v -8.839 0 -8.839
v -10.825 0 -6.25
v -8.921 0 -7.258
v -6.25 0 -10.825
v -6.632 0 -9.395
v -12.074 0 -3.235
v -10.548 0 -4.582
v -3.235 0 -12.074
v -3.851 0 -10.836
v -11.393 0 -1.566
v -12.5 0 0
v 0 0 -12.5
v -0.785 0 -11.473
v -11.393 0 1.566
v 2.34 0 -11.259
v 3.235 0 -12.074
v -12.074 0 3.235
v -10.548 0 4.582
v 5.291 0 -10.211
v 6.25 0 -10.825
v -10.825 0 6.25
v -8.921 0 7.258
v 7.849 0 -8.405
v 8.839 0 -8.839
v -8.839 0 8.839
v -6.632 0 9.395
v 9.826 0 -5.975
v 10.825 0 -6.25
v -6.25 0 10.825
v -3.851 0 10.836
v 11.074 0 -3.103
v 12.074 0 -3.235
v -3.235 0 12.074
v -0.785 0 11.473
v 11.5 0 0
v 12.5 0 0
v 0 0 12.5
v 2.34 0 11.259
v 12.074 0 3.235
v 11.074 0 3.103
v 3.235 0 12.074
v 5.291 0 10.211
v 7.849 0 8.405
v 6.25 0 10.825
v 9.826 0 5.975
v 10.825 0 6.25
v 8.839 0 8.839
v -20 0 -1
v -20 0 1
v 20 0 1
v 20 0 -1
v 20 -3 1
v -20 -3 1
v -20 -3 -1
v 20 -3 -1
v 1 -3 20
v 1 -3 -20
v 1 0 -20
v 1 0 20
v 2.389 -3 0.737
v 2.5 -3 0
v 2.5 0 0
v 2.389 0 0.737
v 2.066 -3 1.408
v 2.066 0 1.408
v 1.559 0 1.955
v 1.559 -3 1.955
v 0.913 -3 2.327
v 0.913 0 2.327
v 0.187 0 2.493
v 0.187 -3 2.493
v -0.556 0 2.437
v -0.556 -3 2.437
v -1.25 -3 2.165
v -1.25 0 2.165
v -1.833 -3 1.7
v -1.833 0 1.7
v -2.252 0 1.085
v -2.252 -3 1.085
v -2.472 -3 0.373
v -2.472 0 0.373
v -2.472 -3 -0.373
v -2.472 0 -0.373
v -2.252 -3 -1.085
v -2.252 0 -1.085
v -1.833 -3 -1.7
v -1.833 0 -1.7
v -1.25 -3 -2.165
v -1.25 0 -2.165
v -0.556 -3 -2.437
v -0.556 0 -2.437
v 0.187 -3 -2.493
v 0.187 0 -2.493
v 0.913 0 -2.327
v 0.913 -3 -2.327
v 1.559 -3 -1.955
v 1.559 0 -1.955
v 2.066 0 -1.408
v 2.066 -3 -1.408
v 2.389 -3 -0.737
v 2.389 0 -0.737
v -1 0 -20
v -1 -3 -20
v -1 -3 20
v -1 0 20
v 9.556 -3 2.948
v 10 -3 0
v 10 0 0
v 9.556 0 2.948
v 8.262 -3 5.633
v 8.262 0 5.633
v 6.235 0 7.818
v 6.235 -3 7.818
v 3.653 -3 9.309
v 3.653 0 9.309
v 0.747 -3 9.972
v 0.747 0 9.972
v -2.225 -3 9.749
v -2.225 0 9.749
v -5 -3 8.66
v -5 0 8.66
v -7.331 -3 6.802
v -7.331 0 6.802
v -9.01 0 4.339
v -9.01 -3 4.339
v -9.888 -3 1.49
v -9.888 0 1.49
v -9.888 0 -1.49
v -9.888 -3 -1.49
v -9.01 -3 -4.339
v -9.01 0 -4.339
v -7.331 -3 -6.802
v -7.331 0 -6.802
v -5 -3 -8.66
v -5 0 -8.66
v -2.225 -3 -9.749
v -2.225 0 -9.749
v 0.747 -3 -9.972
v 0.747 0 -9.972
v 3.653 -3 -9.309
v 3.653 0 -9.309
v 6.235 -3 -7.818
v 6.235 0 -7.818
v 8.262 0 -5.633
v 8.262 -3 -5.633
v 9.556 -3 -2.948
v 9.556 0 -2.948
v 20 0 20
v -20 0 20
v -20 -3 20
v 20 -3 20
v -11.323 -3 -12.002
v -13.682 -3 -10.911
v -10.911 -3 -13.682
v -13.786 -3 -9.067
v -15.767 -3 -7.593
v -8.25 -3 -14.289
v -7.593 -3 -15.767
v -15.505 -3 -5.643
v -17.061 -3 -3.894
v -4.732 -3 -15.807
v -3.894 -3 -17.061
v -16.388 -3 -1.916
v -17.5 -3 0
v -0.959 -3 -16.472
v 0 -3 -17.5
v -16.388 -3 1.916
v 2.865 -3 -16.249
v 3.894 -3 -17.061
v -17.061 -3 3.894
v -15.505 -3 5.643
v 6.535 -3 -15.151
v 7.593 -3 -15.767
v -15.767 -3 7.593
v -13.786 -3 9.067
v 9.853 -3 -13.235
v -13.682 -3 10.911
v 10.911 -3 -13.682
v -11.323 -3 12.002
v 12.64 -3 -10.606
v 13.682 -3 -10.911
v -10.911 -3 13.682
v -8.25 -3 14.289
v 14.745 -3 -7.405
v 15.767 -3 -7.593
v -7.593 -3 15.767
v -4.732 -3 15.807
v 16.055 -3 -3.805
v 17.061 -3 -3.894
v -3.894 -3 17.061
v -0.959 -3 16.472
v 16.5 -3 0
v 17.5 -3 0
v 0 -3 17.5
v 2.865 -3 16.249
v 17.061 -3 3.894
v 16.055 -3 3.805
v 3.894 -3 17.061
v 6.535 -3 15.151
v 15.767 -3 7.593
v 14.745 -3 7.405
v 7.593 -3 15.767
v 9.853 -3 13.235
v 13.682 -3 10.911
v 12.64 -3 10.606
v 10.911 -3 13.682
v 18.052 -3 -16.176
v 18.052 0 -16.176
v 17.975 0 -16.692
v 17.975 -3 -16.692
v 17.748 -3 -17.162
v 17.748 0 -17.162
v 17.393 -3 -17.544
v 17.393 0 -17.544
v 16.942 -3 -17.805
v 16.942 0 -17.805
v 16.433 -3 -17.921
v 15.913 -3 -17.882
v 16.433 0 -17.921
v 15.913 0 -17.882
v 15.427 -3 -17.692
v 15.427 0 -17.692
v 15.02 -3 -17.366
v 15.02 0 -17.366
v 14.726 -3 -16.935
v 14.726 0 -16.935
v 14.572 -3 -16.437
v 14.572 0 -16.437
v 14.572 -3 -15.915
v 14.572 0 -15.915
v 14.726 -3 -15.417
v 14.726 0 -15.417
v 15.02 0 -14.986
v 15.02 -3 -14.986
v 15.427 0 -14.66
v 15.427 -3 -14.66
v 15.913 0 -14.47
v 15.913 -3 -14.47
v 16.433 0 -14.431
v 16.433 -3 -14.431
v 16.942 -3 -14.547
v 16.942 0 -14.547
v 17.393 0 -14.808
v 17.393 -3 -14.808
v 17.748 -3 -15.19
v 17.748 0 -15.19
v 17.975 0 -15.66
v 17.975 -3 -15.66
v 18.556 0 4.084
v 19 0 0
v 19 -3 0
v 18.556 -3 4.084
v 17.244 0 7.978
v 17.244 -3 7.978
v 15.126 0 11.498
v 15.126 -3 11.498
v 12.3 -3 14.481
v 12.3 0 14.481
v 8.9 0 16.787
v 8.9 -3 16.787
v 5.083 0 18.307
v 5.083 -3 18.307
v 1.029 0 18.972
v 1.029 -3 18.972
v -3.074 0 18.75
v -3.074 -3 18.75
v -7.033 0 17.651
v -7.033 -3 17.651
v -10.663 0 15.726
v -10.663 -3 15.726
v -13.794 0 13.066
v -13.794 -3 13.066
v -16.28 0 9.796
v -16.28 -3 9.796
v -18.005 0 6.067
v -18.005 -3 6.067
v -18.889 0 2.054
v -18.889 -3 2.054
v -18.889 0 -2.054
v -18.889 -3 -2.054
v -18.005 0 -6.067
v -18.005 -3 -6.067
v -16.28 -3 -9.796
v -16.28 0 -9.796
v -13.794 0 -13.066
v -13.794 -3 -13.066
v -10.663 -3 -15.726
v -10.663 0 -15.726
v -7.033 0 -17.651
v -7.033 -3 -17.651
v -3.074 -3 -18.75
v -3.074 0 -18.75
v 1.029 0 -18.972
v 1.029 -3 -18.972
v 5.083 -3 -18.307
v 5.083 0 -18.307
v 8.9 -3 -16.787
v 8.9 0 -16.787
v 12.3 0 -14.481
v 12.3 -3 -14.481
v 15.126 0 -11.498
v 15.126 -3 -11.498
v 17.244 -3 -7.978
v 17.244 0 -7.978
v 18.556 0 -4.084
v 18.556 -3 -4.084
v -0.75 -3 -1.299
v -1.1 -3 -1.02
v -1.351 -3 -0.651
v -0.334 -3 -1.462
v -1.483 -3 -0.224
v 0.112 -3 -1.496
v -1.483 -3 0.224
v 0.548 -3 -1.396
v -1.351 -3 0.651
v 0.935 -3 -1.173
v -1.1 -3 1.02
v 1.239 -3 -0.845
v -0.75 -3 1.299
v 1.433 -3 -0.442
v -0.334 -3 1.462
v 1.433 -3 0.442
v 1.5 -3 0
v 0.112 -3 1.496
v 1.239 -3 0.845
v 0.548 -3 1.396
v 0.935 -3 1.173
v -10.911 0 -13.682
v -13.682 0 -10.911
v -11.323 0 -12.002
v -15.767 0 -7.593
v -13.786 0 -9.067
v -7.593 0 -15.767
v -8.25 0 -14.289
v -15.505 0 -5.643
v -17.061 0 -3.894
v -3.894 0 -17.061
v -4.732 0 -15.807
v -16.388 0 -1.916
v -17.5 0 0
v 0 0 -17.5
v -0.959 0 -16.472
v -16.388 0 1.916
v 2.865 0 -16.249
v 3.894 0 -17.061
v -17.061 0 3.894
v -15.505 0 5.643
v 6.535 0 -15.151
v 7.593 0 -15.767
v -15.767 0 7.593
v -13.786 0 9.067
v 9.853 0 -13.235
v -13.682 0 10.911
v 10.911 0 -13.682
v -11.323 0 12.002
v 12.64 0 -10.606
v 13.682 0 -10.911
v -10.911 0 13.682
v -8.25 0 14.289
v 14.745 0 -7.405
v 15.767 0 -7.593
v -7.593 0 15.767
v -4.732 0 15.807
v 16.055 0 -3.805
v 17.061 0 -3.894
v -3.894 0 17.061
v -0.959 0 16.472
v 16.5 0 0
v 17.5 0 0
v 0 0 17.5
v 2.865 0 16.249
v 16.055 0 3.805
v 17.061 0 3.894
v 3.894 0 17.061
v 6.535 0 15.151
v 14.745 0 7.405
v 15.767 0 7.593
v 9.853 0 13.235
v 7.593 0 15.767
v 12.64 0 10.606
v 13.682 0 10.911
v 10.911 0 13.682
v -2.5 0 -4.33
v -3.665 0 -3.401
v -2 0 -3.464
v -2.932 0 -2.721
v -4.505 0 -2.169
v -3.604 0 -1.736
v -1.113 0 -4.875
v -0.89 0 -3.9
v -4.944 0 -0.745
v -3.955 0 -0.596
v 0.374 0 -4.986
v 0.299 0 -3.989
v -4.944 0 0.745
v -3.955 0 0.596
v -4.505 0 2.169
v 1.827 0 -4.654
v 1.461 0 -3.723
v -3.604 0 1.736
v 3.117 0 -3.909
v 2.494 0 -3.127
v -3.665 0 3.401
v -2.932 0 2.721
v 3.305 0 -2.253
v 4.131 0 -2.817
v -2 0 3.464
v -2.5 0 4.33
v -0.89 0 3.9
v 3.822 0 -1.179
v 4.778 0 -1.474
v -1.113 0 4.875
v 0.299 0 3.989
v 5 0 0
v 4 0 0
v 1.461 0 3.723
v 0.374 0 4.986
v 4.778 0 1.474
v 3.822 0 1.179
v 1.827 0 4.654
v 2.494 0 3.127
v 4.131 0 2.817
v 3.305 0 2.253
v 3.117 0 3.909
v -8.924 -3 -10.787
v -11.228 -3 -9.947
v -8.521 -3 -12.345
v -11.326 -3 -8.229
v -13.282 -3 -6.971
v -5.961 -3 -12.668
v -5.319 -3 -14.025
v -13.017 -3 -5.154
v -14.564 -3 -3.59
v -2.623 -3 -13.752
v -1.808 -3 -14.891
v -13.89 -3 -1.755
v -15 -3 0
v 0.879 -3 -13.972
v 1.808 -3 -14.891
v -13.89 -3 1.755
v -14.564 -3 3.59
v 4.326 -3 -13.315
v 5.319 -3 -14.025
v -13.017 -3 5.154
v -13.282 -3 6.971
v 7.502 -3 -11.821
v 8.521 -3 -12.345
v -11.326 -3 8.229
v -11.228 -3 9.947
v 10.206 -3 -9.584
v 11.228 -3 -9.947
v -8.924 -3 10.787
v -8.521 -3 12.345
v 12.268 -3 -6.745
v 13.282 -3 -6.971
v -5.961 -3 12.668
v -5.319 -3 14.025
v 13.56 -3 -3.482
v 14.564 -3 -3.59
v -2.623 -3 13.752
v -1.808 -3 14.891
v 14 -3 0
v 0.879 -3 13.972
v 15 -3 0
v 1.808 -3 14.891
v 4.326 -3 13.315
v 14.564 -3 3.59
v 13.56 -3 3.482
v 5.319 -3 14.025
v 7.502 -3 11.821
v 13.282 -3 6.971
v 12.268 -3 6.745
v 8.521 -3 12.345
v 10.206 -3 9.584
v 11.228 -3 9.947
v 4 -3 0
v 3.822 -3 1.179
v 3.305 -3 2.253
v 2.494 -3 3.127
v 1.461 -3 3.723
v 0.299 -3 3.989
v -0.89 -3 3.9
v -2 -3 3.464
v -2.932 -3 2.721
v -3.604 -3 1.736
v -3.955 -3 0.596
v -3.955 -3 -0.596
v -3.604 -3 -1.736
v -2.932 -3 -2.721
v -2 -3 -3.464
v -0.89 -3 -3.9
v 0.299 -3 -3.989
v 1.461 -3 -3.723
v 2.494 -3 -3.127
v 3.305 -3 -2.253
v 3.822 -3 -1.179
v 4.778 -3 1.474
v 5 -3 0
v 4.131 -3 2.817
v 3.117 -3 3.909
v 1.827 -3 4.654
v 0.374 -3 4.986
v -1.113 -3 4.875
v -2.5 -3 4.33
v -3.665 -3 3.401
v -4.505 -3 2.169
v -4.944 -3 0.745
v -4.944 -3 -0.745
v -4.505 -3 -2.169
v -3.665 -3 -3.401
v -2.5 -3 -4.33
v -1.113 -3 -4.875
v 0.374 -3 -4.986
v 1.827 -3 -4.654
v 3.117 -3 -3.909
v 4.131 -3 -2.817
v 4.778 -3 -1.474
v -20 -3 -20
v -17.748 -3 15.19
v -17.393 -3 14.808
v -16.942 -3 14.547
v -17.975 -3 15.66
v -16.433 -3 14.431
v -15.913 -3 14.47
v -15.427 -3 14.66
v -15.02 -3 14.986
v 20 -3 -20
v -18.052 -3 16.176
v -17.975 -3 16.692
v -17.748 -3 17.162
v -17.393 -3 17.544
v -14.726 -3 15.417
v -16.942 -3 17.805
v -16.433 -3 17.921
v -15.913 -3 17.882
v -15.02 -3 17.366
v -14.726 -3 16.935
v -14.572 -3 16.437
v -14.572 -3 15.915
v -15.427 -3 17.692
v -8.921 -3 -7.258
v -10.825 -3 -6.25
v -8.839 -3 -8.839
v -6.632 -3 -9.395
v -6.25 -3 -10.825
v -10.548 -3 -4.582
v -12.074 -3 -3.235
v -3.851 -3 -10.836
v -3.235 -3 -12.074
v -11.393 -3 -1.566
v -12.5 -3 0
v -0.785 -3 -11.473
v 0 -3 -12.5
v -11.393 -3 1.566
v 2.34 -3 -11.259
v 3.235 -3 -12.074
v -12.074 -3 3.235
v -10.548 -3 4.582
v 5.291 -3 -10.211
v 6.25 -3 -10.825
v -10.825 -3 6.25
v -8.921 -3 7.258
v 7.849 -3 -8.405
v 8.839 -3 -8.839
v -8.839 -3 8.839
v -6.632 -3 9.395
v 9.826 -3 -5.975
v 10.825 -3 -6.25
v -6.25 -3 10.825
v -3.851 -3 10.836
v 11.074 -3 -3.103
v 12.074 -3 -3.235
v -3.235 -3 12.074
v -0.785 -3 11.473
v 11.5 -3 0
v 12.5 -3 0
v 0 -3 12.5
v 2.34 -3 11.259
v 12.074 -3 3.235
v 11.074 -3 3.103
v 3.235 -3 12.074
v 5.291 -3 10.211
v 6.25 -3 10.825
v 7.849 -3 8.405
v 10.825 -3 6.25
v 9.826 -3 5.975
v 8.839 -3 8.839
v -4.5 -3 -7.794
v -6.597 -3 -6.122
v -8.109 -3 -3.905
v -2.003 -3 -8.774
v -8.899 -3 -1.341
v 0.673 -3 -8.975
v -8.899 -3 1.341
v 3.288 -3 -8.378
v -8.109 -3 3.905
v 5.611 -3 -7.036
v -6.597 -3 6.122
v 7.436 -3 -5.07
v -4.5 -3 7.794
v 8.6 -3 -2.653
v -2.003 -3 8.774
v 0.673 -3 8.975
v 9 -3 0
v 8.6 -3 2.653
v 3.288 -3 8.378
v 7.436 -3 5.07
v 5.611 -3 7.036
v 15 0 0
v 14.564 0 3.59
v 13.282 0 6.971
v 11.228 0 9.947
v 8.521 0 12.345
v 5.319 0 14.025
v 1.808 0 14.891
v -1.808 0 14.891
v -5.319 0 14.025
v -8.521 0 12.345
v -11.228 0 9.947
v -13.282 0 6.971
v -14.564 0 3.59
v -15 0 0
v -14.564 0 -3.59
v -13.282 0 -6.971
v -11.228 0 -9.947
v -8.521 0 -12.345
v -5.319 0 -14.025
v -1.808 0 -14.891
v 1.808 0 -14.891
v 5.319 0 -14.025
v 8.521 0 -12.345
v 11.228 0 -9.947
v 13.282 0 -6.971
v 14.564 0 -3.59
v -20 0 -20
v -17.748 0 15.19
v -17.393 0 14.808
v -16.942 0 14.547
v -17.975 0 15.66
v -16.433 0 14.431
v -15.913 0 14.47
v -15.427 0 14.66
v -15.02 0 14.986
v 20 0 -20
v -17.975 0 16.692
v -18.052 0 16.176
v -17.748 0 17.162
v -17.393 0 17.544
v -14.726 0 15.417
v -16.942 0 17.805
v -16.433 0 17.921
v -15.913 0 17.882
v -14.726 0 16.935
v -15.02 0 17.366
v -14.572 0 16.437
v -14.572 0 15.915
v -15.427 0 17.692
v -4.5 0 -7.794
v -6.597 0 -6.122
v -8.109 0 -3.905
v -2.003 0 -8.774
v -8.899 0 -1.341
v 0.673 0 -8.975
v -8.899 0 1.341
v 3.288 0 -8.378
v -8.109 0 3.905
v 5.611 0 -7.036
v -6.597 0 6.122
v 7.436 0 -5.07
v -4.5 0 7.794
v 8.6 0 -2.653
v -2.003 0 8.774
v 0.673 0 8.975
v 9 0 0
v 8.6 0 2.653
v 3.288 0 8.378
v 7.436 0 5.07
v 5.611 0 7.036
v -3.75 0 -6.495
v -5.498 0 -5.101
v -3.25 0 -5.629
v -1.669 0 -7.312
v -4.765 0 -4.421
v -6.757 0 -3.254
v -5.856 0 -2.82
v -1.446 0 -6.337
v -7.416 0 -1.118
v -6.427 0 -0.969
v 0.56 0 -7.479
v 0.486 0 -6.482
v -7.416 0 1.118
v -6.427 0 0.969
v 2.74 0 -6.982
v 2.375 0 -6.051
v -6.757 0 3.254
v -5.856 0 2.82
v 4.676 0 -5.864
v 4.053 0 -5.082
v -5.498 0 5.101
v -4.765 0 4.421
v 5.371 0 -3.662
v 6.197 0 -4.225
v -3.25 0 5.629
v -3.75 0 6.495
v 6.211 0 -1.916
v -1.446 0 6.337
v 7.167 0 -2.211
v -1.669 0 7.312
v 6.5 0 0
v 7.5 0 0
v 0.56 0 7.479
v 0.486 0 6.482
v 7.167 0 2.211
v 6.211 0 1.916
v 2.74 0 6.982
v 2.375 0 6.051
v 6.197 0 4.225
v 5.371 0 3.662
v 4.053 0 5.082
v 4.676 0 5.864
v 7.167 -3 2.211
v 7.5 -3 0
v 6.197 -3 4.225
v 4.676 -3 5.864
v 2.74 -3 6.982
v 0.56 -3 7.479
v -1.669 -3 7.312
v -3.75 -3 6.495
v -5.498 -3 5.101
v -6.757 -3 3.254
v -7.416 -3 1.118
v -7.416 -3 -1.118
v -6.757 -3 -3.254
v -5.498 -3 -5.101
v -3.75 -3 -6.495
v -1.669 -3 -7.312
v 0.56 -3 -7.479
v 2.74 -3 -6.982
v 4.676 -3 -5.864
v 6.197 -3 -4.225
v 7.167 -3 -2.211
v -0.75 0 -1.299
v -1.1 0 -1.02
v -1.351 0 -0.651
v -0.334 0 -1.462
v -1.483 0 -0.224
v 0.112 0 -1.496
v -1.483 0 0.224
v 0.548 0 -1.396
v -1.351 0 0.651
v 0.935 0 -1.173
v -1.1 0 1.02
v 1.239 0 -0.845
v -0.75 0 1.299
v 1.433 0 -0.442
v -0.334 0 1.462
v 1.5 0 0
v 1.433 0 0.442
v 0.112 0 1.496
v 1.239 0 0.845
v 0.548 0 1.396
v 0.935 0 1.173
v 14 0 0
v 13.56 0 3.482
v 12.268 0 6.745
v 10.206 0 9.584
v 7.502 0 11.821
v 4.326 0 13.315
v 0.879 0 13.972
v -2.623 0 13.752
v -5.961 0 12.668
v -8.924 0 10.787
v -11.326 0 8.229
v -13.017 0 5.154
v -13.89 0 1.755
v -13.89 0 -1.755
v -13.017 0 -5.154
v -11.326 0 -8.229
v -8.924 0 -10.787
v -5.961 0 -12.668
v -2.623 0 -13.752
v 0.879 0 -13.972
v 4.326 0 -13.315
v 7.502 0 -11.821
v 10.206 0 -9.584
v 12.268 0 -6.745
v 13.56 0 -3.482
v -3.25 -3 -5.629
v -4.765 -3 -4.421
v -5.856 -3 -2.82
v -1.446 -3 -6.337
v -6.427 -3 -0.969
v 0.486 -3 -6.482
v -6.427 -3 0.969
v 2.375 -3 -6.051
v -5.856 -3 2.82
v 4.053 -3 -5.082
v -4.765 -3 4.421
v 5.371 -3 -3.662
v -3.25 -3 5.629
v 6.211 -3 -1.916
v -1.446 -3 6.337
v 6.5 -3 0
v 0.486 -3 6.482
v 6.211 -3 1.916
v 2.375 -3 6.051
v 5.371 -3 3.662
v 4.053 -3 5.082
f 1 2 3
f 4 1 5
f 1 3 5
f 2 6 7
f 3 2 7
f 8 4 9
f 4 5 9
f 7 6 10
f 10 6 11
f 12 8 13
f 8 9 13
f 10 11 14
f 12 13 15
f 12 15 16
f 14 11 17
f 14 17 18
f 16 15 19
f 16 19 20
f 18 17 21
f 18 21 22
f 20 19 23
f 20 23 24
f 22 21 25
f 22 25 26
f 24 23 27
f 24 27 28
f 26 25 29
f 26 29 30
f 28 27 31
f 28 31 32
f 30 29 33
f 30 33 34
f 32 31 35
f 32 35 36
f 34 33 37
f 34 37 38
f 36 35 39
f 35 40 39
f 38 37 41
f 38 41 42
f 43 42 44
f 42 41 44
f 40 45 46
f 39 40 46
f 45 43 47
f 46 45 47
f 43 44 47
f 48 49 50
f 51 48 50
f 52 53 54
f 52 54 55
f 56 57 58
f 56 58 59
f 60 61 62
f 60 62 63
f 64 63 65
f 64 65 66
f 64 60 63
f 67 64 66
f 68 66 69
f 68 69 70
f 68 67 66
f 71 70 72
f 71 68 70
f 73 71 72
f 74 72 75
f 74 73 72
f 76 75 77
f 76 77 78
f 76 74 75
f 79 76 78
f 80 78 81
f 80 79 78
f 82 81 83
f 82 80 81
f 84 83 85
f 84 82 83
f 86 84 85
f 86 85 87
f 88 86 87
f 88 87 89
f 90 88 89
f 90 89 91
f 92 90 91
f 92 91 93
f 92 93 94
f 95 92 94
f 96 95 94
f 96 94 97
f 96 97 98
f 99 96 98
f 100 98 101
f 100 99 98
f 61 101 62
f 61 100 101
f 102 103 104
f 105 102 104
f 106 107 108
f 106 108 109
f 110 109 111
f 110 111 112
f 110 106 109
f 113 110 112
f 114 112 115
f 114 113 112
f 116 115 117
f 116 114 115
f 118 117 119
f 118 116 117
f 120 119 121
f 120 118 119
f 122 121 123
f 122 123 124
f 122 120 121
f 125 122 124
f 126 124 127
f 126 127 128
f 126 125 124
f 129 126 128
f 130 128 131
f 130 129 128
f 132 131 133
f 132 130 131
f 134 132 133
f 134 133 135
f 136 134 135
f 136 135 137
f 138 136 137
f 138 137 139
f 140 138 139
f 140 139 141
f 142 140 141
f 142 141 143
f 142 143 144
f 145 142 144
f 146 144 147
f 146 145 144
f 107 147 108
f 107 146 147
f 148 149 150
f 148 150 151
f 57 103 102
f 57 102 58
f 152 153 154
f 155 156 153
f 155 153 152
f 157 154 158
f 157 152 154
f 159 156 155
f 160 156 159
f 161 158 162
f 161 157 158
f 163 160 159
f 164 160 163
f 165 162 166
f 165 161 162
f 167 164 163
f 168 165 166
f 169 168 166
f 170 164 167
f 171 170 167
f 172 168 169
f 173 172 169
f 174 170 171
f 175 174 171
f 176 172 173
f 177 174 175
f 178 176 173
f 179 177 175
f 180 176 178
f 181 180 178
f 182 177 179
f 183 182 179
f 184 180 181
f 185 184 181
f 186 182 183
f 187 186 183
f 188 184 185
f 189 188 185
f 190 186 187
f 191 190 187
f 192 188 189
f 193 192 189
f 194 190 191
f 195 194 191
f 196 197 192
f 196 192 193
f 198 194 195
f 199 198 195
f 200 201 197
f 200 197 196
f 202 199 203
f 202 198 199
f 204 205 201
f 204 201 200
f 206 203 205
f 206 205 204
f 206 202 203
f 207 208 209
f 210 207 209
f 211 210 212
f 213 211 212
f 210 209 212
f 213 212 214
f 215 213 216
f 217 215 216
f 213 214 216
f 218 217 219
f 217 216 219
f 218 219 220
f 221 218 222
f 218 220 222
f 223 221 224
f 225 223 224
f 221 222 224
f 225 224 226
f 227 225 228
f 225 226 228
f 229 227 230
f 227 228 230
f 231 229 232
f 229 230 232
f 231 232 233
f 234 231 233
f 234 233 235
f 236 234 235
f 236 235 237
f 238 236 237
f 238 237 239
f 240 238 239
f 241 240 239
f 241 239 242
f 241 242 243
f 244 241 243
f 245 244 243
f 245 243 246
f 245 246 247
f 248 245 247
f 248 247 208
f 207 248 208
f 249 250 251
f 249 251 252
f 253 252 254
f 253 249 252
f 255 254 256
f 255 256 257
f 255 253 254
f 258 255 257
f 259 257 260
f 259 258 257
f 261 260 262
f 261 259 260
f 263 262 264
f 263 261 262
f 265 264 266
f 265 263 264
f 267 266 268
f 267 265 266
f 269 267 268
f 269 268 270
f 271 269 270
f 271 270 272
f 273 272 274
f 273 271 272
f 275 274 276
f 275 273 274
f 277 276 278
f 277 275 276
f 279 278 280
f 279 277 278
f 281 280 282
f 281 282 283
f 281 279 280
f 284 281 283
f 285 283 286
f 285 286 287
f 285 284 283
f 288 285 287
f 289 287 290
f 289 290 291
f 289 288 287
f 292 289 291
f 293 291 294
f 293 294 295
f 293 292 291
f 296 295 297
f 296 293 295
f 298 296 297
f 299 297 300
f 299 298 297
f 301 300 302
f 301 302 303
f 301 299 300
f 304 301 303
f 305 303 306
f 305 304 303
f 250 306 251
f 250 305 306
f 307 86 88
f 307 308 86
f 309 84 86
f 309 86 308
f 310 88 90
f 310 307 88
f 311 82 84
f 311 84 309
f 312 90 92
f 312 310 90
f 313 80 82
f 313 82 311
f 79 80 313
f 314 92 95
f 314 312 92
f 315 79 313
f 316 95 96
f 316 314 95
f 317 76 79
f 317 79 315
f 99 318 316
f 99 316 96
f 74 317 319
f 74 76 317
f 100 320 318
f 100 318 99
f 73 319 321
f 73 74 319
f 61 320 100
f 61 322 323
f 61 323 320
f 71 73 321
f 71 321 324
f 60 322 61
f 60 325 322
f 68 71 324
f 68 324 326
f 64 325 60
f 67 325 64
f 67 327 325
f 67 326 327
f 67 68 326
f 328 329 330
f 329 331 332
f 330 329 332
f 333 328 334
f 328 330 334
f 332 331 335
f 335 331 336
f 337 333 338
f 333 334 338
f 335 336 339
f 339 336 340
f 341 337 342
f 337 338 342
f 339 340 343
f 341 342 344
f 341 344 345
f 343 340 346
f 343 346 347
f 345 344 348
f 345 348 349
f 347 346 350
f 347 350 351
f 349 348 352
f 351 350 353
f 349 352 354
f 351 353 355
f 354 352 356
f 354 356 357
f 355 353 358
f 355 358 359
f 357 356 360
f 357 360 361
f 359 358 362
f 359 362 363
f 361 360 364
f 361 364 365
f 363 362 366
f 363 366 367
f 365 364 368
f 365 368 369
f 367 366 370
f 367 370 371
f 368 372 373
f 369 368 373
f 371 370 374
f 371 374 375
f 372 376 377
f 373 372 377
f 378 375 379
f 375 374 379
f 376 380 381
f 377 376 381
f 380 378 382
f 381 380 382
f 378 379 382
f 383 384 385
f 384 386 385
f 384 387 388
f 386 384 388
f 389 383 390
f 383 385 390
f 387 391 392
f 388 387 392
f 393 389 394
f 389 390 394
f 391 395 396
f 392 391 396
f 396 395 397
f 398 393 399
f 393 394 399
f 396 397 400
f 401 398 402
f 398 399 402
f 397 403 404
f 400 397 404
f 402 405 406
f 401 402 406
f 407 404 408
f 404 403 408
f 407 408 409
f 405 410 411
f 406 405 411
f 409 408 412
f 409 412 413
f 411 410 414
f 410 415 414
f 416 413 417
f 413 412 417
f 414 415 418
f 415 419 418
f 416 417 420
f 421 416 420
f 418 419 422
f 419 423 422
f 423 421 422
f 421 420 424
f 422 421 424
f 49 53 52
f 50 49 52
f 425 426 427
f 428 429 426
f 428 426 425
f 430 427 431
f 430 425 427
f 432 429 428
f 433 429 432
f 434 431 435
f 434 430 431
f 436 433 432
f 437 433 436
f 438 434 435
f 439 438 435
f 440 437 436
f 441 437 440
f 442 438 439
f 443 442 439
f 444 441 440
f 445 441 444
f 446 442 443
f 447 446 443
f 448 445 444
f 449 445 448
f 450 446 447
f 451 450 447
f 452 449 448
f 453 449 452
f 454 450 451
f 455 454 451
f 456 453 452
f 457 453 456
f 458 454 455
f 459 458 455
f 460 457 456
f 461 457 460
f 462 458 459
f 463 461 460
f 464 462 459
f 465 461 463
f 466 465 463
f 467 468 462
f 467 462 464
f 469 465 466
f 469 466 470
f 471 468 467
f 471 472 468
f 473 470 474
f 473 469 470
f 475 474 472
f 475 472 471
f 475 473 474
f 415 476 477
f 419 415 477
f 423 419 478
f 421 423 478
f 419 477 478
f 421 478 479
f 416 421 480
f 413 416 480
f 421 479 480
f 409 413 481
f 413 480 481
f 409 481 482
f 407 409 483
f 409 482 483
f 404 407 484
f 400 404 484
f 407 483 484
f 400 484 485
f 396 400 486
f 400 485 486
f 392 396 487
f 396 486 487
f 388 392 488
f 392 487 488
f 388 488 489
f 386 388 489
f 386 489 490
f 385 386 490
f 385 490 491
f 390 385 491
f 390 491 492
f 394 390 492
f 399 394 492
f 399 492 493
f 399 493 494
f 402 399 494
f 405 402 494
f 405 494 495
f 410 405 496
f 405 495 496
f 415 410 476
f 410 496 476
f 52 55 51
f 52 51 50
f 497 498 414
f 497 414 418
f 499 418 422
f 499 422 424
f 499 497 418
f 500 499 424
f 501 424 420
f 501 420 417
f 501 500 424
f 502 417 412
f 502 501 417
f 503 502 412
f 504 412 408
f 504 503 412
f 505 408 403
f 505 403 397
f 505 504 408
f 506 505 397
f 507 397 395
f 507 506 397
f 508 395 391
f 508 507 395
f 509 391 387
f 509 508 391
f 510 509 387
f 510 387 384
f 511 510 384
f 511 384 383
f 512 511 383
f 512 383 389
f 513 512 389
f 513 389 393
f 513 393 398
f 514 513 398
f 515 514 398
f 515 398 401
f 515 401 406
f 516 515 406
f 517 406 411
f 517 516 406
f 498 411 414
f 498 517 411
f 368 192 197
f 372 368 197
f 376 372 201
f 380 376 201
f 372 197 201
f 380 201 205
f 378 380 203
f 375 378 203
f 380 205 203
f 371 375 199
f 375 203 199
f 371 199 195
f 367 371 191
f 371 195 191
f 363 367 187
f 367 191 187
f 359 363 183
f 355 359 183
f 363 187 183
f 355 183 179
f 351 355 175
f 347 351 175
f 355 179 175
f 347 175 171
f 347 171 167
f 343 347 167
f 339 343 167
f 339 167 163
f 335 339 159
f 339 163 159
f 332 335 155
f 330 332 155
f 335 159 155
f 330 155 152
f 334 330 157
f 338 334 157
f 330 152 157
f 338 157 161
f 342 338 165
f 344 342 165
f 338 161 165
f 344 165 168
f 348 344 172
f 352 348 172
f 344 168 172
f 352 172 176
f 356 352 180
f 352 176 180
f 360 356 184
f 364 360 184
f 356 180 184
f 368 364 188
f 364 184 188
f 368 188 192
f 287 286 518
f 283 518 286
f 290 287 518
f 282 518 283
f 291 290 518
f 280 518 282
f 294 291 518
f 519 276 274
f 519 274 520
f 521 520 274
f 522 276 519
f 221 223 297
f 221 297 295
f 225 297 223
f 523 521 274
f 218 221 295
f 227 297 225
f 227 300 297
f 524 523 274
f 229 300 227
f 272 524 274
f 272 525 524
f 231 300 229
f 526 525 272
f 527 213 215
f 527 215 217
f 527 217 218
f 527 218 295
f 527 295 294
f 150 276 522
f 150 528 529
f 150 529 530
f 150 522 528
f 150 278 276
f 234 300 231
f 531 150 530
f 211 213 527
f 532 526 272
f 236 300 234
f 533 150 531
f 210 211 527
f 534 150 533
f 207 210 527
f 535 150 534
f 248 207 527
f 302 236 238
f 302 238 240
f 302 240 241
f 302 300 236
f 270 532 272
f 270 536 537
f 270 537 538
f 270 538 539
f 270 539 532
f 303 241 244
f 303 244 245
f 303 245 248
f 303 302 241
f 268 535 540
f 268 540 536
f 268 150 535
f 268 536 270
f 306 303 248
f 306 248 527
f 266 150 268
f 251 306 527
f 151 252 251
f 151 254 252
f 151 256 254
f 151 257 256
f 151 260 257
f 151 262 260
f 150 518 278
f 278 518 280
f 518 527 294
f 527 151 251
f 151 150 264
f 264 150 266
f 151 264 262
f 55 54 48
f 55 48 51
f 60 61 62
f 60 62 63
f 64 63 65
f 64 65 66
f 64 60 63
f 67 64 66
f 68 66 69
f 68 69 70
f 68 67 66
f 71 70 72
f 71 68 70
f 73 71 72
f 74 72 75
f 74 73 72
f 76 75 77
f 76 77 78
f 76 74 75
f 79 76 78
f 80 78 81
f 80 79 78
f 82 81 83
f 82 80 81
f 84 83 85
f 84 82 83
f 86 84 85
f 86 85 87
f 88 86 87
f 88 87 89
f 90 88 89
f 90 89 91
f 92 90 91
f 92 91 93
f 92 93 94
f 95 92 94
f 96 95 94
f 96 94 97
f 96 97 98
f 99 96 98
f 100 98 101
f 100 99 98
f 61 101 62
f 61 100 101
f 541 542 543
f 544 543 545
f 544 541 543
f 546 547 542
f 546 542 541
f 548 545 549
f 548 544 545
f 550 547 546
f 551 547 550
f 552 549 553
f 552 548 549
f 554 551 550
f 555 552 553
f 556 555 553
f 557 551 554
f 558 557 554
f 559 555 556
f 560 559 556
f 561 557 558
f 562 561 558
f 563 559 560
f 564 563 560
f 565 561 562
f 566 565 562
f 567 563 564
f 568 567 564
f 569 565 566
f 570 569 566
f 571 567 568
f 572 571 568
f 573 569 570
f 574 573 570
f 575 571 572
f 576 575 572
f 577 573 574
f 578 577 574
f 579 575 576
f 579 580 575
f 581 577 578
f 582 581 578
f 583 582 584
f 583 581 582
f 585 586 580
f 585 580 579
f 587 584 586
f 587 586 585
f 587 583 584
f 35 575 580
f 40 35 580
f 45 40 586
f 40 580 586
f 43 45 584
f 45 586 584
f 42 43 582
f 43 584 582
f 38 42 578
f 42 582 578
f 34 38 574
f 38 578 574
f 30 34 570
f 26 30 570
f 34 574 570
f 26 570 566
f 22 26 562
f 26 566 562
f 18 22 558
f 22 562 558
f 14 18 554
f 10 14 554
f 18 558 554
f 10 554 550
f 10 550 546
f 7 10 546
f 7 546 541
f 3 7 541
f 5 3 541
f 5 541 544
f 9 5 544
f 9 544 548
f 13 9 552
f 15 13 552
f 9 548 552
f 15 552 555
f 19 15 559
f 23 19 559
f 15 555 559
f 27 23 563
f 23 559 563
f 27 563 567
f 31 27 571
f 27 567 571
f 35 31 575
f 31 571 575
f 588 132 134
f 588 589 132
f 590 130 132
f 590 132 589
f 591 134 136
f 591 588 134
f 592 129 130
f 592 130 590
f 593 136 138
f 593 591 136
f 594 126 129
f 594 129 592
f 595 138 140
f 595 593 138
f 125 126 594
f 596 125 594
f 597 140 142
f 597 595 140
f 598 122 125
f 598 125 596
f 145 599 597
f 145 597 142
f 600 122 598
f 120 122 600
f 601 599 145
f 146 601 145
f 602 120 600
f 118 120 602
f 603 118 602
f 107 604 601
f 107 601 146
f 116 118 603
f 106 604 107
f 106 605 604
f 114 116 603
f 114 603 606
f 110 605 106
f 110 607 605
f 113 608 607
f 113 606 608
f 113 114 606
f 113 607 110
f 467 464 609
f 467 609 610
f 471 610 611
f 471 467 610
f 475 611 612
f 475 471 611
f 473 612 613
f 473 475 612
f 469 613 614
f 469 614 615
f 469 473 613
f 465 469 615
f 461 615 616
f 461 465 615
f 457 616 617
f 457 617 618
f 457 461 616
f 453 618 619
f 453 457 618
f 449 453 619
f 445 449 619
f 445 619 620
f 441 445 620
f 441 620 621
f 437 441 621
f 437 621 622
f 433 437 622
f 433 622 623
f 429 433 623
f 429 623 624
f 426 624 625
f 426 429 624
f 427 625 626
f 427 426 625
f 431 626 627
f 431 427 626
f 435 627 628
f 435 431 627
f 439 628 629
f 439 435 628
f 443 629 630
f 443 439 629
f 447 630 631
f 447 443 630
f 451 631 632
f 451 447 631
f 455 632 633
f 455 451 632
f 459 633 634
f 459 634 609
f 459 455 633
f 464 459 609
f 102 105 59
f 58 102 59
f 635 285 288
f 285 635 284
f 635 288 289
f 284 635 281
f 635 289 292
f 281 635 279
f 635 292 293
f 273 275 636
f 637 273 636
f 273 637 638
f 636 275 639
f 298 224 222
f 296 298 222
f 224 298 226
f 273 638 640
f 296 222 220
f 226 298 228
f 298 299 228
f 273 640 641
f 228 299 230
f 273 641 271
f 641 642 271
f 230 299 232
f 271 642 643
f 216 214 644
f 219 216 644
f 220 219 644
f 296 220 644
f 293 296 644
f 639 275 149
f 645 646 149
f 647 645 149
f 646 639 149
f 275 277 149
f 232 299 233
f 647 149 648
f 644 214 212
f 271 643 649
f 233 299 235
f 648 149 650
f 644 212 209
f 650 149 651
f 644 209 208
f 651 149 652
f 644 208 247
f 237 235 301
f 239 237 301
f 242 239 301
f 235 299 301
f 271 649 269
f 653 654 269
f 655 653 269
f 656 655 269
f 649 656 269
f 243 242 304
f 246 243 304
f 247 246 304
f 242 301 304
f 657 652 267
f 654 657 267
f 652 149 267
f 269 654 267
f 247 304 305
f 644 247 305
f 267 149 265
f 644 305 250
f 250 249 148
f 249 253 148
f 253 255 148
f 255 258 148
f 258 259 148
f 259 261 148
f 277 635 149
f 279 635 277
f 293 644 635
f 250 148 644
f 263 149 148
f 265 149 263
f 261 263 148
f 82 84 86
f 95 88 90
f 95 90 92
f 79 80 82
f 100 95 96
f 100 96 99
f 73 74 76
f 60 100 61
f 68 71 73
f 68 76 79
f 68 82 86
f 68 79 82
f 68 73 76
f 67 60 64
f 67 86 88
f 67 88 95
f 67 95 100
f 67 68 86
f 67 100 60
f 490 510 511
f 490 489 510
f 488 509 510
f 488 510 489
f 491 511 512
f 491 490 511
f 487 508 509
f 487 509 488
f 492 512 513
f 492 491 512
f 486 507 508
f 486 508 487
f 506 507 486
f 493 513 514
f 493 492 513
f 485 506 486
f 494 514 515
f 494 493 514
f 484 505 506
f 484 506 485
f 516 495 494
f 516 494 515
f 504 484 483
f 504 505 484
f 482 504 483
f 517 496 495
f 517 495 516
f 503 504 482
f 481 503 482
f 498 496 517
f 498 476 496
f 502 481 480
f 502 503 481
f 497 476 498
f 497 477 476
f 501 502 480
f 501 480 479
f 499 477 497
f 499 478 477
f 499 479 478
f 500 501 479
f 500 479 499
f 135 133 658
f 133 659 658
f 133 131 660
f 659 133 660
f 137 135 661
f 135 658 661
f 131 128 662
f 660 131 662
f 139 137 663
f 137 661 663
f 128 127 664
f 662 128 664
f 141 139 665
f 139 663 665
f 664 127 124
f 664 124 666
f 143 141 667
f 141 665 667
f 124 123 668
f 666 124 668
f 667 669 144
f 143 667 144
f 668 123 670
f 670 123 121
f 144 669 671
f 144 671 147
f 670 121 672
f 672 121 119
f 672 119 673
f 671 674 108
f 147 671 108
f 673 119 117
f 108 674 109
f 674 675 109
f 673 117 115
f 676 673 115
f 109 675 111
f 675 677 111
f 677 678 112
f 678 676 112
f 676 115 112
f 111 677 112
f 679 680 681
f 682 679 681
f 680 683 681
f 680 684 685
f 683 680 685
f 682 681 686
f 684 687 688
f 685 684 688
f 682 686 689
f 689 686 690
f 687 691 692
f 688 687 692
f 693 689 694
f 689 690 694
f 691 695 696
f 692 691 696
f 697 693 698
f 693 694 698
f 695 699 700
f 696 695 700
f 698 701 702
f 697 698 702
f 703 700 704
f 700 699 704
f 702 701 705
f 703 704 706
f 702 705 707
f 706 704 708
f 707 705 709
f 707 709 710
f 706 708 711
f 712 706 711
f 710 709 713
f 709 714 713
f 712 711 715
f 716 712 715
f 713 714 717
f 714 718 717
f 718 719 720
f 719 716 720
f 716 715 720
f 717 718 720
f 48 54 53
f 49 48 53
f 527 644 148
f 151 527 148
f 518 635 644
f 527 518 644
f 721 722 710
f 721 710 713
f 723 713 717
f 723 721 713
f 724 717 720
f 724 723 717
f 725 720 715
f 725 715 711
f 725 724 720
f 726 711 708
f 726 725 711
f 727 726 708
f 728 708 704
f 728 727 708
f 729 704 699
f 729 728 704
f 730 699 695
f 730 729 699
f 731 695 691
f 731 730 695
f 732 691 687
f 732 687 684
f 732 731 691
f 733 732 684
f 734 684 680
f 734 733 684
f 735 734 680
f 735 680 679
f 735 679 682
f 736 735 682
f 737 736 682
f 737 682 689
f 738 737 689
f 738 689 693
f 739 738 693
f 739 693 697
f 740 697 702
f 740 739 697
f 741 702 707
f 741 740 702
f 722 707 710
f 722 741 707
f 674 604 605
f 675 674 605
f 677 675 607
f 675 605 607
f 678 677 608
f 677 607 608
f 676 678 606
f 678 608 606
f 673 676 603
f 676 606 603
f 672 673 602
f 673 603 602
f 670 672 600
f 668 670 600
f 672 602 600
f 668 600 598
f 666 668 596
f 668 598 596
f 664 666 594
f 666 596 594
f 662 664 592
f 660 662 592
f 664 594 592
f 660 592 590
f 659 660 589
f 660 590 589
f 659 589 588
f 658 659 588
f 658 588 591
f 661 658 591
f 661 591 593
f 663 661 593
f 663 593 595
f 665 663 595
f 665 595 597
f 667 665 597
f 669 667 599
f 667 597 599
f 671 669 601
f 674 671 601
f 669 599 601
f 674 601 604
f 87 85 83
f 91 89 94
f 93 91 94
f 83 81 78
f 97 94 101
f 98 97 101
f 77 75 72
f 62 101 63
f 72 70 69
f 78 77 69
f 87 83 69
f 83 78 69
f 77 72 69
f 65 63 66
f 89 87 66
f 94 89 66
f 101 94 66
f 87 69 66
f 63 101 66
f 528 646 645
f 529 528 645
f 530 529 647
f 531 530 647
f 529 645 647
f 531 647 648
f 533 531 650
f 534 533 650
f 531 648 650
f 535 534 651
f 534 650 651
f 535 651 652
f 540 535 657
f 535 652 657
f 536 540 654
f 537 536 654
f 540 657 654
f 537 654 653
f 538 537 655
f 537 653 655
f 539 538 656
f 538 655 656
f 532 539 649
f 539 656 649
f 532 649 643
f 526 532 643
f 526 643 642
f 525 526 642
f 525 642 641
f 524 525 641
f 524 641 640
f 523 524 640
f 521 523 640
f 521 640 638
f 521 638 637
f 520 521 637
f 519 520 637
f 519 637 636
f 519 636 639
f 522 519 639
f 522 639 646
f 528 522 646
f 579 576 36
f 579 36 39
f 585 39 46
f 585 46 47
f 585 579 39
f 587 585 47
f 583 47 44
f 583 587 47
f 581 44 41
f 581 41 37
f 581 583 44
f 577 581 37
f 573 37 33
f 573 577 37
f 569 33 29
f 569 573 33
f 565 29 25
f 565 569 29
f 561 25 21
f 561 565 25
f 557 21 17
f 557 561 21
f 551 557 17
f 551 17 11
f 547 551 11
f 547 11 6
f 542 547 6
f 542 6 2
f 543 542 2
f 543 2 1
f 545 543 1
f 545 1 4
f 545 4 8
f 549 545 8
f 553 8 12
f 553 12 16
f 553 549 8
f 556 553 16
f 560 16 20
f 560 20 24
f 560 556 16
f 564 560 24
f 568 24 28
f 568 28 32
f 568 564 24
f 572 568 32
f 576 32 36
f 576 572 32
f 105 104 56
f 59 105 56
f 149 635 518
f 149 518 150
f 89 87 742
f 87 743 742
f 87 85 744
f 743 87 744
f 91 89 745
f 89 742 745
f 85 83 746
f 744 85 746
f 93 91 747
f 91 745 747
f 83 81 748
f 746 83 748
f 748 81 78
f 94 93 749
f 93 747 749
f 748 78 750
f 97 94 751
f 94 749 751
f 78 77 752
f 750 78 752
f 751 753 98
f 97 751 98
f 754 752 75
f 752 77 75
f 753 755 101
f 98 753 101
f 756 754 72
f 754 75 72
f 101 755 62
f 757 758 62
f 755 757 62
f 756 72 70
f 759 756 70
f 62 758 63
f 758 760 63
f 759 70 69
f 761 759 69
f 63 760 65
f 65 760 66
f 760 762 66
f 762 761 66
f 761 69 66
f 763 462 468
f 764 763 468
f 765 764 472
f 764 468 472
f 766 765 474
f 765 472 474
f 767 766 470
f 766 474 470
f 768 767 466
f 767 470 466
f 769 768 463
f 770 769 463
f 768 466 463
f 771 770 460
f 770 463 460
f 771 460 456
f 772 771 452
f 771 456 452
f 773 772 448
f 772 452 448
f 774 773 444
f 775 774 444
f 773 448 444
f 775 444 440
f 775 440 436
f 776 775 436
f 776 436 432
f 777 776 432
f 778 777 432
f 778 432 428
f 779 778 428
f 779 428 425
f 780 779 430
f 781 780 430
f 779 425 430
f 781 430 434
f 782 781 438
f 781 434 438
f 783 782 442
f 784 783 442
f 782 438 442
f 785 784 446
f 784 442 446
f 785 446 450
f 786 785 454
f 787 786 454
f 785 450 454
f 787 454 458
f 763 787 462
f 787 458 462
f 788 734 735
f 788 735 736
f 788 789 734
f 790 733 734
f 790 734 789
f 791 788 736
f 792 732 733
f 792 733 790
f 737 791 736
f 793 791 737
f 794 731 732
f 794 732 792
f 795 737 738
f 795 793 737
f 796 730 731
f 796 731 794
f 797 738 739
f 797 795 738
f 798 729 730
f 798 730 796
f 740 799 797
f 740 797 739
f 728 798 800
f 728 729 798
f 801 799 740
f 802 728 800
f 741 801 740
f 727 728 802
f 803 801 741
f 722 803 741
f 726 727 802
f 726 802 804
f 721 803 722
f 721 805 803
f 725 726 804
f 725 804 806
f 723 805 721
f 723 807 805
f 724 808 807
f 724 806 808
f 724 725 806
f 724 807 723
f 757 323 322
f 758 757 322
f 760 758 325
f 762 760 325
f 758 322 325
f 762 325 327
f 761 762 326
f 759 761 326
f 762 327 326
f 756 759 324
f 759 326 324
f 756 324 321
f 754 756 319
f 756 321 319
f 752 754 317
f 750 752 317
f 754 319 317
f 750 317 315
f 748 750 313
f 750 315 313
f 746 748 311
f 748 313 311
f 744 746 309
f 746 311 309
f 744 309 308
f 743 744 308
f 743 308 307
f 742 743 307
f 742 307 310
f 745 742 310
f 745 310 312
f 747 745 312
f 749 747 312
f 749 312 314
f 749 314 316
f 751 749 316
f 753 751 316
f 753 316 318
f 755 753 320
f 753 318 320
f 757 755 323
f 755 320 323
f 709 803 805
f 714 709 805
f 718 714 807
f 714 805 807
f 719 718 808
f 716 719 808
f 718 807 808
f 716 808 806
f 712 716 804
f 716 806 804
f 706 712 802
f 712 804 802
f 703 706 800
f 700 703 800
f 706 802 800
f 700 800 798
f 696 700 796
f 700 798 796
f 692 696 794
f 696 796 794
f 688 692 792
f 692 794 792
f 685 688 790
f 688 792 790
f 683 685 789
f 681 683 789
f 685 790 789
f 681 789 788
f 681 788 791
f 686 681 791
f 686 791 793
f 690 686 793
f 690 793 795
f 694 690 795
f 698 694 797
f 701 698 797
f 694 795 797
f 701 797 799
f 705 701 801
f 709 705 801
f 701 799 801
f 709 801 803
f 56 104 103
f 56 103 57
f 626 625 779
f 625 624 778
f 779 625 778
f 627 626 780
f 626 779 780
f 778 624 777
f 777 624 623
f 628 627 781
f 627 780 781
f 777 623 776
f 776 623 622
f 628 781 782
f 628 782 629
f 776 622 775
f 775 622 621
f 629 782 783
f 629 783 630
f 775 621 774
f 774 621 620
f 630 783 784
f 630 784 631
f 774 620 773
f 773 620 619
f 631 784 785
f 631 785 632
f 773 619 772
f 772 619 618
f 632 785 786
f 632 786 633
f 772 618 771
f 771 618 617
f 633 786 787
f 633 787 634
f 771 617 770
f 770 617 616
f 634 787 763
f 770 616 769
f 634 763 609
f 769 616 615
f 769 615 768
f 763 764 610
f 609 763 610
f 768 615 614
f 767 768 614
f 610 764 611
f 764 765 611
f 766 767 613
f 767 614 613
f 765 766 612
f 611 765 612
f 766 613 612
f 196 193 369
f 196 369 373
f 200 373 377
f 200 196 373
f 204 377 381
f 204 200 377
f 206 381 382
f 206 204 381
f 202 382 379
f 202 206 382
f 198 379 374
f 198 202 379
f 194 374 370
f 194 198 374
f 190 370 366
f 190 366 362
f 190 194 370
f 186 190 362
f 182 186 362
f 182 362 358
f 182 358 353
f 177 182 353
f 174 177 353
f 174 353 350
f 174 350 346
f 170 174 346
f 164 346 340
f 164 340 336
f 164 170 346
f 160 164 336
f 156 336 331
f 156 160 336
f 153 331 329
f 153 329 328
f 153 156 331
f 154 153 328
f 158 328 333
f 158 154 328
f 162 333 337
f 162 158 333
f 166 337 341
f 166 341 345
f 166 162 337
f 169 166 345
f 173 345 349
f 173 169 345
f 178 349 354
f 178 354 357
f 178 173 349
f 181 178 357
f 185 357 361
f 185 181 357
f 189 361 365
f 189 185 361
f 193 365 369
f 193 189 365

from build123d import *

# Parameters (mm, degrees)
F0_W      = 40
F0_H      = 40
F0_R      = 19
F1_DEPTH  = 3
F2_R      = 1.75
F3_DEPTH  = 5
F6_COUNT  = 2
F8_R      = 10
F8_R_2    = 9
F18_DEPTH = 3
F9_R      = 5
F9_R_2    = 4
F10_R     = 7.5
F10_R_2   = 6.5
F11_R     = 2.5
F11_R_2   = 1.5
F12_R     = 2.5
F13_R     = 12.5
F13_R_2   = 11.5
F14_R     = 15
F14_R_2   = 14
F15_R     = 17.5
F15_R_2   = 16.5
F16_W     = 2
F16_H     = 40
F17_W     = 40
F17_H     = 2


# Not quite as in the source:
# - a feature names something its author has since deleted; it is built from what else it names


with BuildPart() as f1:
    # F0 (on Front) → F1 (new body)
    with BuildSketch(Plane.XZ):
        Rectangle(F0_W, F0_H)
        Circle(F0_R, mode=Mode.SUBTRACT)
    extrude(amount=F1_DEPTH)


with BuildPart() as f3:
    # F2 (on face) → F3 (new body)
    with BuildSketch(Plane(origin=(0, 0, 0), x_dir=(-1, 0, 0), z_dir=(0, 1, 0))):
        with Locations((16.3023483751, 16.1759720192)):
            Circle(F2_R)
    extrude(amount=-F3_DEPTH)


with BuildPart() as f6_1:
    # F6: instance of F3
    add(f3.part.rotate(Axis((0, -5.2183736116, 0), (0, -1, 0)), 1 * 360 / F6_COUNT))


with BuildPart() as f1_1:
    add(f1.part)

    # F7: cut F6_1, F3
    add(f6_1.part, mode=Mode.SUBTRACT)
    add(f3.part, mode=Mode.SUBTRACT)


with BuildPart() as f18:
    # F8 (on face) → F18 (new body)
    with BuildSketch(Plane.XZ.offset(3)):
        Circle(F8_R)
        Circle(F8_R_2, mode=Mode.SUBTRACT)
    extrude(amount=-F18_DEPTH)


with BuildPart() as f18b:
    # F9 (on face) → F18, piece 2 (new body)
    with BuildSketch(Plane.XZ.offset(3)):
        Circle(F9_R)
        Circle(F9_R_2, mode=Mode.SUBTRACT)
    extrude(amount=-F18_DEPTH)


with BuildPart() as f18c:
    # F10 (on face) → F18, piece 3 (new body)
    with BuildSketch(Plane.XZ.offset(3)):
        Circle(F10_R)
        Circle(F10_R_2, mode=Mode.SUBTRACT)
    extrude(amount=-F18_DEPTH)


with BuildPart() as f18d:
    # F11 (on face) → F18, piece 4 (new body)
    with BuildSketch(Plane.XZ.offset(3)):
        Circle(F11_R)
        Circle(F11_R_2, mode=Mode.SUBTRACT)
    extrude(amount=-F18_DEPTH)


with BuildPart() as f18e:
    # F12 (on face) → F18, piece 5 (new body)
    with BuildSketch(Plane.XZ.offset(3)):
        Circle(F12_R)
    extrude(amount=-F18_DEPTH)


with BuildPart() as f18f:
    # F13 (on face) → F18, piece 6 (new body)
    with BuildSketch(Plane.XZ.offset(3)):
        Circle(F13_R)
        Circle(F13_R_2, mode=Mode.SUBTRACT)
    extrude(amount=-F18_DEPTH)


with BuildPart() as f18g:
    # F14 (on face) → F18, piece 7 (new body)
    with BuildSketch(Plane.XZ.offset(3)):
        Circle(F14_R)
        Circle(F14_R_2, mode=Mode.SUBTRACT)
    extrude(amount=-F18_DEPTH)


with BuildPart() as f18h:
    # F15 (on face) → F18, piece 8 (new body)
    with BuildSketch(Plane.XZ.offset(3)):
        Circle(F15_R)
        Circle(F15_R_2, mode=Mode.SUBTRACT)
    extrude(amount=-F18_DEPTH)


with BuildPart() as f18i:
    # F16 (on face) → F18, piece 9 (new body)
    with BuildSketch(Plane.XZ.offset(3)):
        Rectangle(F16_W, F16_H)
    extrude(amount=-F18_DEPTH)


with BuildPart() as f18j:
    # F17 (on face) → F18, piece 10 (new body)
    with BuildSketch(Plane.XZ.offset(3)):
        Rectangle(F17_W, F17_H)
    extrude(amount=-F18_DEPTH)


solid = Compound([f1_1.part, f18.part, f18b.part, f18c.part, f18d.part, f18e.part, f18f.part, f18g.part, f18h.part, f18i.part, f18j.part])
